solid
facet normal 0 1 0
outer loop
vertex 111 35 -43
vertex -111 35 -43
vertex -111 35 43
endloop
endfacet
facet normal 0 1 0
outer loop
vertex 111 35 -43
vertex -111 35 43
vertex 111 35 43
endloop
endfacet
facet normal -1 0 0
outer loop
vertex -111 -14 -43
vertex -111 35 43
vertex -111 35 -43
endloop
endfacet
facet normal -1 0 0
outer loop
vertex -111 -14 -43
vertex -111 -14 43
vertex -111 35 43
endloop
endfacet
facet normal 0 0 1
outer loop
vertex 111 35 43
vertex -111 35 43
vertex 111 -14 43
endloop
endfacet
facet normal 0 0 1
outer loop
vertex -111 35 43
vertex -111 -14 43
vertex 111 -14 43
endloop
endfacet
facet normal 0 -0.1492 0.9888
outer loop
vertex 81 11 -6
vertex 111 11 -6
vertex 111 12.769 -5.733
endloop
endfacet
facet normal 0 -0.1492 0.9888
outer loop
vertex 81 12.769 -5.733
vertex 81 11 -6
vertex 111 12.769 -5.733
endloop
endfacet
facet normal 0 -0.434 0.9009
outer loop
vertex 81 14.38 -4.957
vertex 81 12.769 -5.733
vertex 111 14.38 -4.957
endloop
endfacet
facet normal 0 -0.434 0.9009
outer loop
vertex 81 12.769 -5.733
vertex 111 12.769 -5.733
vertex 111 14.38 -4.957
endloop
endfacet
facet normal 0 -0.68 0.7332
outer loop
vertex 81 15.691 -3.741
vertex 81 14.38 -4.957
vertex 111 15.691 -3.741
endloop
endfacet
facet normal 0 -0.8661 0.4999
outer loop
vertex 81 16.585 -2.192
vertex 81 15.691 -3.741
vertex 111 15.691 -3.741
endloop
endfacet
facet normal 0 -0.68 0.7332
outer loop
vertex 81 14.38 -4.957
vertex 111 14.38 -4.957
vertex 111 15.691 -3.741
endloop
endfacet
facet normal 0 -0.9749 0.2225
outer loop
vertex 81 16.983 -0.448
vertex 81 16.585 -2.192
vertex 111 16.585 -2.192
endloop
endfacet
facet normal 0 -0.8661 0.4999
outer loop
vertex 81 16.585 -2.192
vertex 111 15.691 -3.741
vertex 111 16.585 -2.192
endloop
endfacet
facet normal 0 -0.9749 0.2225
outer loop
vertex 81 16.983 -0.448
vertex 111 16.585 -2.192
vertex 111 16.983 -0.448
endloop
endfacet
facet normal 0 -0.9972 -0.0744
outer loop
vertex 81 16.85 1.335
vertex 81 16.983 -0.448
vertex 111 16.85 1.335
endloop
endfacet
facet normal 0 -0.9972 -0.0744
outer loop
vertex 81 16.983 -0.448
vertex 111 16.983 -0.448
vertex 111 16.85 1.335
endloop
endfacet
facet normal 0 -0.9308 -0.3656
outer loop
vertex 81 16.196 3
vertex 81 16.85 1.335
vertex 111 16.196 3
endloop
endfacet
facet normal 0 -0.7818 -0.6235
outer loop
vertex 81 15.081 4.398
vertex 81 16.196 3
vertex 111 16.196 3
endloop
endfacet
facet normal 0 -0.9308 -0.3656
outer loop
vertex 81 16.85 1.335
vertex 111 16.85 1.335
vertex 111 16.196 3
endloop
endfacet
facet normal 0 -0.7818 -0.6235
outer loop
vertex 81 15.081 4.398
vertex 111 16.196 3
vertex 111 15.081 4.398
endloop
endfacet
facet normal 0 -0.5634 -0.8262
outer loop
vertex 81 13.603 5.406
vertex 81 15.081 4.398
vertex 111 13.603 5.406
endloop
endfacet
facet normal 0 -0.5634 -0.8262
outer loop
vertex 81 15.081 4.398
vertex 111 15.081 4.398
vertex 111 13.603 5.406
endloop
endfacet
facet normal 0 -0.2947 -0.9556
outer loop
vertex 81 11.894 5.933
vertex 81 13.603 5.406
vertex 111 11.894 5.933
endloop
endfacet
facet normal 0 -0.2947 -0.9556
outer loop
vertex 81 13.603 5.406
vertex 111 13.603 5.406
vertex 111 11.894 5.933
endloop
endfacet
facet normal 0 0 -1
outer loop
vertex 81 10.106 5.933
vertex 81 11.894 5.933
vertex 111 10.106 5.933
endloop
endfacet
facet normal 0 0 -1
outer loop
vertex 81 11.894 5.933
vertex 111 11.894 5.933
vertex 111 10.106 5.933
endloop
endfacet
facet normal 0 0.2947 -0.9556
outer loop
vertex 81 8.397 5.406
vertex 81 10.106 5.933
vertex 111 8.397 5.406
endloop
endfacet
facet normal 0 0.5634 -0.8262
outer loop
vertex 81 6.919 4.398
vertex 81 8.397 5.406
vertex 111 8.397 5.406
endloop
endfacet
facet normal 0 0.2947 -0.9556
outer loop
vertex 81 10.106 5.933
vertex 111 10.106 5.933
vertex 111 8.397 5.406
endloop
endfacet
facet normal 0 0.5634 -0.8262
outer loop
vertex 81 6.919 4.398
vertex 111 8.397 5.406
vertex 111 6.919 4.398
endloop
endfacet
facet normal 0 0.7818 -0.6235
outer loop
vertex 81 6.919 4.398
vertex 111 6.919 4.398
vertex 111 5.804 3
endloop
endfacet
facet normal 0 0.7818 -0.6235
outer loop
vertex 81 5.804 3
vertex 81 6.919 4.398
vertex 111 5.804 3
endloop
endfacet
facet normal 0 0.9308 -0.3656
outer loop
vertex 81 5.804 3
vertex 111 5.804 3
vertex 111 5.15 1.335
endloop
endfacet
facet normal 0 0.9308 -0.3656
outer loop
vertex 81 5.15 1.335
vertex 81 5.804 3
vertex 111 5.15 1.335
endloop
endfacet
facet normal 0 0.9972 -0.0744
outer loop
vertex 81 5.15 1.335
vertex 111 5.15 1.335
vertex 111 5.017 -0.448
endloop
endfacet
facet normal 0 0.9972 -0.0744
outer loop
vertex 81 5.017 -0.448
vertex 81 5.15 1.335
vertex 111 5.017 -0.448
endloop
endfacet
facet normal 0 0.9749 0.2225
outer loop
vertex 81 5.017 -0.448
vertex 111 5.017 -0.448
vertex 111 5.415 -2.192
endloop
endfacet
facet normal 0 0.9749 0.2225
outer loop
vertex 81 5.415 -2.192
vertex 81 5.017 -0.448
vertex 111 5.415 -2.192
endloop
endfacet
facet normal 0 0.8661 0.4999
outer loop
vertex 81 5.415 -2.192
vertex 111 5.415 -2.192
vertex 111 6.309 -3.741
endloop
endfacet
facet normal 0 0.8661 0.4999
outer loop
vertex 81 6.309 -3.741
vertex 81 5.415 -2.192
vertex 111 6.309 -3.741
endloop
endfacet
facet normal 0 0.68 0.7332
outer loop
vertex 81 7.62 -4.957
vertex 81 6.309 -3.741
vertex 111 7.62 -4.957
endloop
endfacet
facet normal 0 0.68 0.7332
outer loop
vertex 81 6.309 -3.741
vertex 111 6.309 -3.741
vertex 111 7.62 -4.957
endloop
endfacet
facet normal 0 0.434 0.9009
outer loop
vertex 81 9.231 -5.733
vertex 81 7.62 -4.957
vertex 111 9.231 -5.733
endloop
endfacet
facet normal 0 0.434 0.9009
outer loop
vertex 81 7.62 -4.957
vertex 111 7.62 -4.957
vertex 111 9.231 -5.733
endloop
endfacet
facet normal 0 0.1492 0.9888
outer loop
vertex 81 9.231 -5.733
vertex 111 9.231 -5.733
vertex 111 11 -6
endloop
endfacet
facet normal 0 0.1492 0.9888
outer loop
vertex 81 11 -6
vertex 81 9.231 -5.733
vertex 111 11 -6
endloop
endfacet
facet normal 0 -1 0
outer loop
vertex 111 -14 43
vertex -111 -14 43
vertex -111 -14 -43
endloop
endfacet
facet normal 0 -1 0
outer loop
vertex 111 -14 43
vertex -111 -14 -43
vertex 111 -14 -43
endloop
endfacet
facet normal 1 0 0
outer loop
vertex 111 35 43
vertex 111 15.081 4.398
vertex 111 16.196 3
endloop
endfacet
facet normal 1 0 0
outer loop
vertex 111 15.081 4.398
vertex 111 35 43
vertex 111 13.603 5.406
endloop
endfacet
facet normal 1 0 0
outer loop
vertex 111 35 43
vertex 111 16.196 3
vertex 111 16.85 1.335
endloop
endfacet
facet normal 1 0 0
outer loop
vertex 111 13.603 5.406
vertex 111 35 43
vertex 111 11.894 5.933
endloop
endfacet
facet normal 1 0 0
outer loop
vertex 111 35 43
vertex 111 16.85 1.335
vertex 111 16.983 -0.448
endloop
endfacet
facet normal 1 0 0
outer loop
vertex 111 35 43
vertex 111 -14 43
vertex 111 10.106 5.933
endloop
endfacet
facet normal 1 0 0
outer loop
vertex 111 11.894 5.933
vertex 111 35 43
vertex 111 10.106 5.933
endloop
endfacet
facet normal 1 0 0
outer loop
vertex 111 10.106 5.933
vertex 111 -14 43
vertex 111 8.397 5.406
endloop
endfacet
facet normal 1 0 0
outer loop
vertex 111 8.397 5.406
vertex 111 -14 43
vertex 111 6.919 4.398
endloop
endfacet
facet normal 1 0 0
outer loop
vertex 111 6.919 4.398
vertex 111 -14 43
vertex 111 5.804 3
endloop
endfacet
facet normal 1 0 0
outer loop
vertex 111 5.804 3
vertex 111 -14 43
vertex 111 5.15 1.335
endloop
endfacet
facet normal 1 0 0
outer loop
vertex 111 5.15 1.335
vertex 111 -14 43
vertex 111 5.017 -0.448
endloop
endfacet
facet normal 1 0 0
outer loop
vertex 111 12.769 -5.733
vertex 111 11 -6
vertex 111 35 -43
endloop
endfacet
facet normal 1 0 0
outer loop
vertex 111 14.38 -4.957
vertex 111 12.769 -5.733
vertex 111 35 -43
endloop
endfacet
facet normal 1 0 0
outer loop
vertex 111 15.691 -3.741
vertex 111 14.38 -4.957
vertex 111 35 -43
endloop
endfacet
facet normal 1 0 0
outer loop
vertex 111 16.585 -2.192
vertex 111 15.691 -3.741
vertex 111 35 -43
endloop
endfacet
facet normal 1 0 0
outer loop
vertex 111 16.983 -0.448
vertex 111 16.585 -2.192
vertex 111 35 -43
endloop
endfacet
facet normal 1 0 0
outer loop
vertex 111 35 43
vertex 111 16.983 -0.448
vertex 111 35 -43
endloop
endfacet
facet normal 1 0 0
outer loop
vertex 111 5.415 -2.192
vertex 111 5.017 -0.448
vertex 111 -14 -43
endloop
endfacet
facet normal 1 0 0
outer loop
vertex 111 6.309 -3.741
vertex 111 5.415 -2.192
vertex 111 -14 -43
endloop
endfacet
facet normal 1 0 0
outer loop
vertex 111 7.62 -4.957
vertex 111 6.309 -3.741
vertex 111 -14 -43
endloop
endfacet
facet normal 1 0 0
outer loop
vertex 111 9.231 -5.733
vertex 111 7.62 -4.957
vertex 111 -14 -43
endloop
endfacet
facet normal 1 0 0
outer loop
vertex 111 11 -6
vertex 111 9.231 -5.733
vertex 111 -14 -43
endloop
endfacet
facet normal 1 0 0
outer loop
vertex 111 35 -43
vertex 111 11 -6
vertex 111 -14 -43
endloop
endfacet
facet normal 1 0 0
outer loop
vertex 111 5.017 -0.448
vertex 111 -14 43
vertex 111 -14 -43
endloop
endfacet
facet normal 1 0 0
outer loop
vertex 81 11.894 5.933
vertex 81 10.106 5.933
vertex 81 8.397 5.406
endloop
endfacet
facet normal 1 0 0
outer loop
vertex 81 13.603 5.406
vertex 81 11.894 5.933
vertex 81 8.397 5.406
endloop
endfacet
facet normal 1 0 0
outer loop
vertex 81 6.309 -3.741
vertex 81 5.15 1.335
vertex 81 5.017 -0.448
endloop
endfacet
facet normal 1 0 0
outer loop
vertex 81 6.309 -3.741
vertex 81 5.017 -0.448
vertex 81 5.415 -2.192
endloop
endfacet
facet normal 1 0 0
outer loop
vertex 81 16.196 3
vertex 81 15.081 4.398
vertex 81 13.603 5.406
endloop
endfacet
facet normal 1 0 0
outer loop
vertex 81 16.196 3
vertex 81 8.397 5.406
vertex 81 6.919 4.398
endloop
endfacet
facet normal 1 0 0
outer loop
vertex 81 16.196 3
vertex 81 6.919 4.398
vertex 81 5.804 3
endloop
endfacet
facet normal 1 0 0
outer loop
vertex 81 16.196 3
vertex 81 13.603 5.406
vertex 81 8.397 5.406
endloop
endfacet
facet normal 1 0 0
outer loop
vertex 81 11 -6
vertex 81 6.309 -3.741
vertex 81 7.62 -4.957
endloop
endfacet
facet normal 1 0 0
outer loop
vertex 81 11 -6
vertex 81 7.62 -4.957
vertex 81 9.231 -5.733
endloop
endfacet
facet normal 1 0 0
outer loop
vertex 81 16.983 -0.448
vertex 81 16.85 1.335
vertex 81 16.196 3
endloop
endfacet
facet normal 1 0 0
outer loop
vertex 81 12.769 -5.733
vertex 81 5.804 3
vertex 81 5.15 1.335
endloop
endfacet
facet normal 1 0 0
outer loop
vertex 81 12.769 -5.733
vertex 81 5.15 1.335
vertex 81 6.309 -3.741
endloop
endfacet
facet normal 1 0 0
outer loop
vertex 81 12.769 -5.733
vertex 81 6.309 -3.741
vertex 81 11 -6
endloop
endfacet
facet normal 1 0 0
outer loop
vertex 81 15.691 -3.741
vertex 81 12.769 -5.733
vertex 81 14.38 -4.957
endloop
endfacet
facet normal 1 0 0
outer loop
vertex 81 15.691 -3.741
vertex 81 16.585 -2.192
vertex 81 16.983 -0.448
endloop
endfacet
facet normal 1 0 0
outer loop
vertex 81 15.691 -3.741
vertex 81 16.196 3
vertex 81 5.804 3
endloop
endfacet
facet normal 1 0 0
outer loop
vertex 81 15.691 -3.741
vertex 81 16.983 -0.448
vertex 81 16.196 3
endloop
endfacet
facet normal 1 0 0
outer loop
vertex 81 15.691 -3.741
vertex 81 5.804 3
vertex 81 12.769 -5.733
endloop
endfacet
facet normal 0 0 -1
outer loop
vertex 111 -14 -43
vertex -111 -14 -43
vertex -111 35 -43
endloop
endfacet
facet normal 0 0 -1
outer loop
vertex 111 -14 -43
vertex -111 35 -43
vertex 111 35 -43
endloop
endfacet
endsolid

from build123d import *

# Parameters (mm, degrees)
SKETCH1_W           = 222
SKETCH1_H           = 86
BOSS_EXTRUDE1_DEPTH = 22
SKETCH2_R           = 6
CUT_EXTRUDE1_DEPTH  = 30
SKETCH3_W           = 222
SKETCH3_H           = 86
BOSS_EXTRUDE2_DEPTH = 14
SKETCH4_W           = 222
SKETCH4_H           = 86
BOSS_EXTRUDE3_DEPTH = 13


with BuildPart() as part:
    # Sketch1 → Boss-Extrude1 (new body)
    with BuildSketch(Plane(origin=(0, 0, 0), x_dir=(1, 0, 0), z_dir=(0, 1, 0))):
        Rectangle(SKETCH1_W, SKETCH1_H)
    extrude(amount=BOSS_EXTRUDE1_DEPTH)

    # Sketch2 → Cut-Extrude1 (cut)
    with BuildSketch(Plane(origin=(111, 0, 0), x_dir=(0, 0, -1), z_dir=(1, 0, 0))):
        with Locations((0, 11)):
            Circle(SKETCH2_R)
    extrude(amount=-CUT_EXTRUDE1_DEPTH, mode=Mode.SUBTRACT)

    # Sketch3 → Boss-Extrude2 (add)
    with BuildSketch(Plane.XZ):
        Rectangle(SKETCH3_W, SKETCH3_H)
    extrude(amount=BOSS_EXTRUDE2_DEPTH)

    # Sketch4 → Boss-Extrude3 (add)
    with BuildSketch(Plane(origin=(0, 22, 0), x_dir=(1, 0, 0), z_dir=(0, 1, 0))):
        Rectangle(SKETCH4_W, SKETCH4_H)
    extrude(amount=BOSS_EXTRUDE3_DEPTH)


solid = part.part
